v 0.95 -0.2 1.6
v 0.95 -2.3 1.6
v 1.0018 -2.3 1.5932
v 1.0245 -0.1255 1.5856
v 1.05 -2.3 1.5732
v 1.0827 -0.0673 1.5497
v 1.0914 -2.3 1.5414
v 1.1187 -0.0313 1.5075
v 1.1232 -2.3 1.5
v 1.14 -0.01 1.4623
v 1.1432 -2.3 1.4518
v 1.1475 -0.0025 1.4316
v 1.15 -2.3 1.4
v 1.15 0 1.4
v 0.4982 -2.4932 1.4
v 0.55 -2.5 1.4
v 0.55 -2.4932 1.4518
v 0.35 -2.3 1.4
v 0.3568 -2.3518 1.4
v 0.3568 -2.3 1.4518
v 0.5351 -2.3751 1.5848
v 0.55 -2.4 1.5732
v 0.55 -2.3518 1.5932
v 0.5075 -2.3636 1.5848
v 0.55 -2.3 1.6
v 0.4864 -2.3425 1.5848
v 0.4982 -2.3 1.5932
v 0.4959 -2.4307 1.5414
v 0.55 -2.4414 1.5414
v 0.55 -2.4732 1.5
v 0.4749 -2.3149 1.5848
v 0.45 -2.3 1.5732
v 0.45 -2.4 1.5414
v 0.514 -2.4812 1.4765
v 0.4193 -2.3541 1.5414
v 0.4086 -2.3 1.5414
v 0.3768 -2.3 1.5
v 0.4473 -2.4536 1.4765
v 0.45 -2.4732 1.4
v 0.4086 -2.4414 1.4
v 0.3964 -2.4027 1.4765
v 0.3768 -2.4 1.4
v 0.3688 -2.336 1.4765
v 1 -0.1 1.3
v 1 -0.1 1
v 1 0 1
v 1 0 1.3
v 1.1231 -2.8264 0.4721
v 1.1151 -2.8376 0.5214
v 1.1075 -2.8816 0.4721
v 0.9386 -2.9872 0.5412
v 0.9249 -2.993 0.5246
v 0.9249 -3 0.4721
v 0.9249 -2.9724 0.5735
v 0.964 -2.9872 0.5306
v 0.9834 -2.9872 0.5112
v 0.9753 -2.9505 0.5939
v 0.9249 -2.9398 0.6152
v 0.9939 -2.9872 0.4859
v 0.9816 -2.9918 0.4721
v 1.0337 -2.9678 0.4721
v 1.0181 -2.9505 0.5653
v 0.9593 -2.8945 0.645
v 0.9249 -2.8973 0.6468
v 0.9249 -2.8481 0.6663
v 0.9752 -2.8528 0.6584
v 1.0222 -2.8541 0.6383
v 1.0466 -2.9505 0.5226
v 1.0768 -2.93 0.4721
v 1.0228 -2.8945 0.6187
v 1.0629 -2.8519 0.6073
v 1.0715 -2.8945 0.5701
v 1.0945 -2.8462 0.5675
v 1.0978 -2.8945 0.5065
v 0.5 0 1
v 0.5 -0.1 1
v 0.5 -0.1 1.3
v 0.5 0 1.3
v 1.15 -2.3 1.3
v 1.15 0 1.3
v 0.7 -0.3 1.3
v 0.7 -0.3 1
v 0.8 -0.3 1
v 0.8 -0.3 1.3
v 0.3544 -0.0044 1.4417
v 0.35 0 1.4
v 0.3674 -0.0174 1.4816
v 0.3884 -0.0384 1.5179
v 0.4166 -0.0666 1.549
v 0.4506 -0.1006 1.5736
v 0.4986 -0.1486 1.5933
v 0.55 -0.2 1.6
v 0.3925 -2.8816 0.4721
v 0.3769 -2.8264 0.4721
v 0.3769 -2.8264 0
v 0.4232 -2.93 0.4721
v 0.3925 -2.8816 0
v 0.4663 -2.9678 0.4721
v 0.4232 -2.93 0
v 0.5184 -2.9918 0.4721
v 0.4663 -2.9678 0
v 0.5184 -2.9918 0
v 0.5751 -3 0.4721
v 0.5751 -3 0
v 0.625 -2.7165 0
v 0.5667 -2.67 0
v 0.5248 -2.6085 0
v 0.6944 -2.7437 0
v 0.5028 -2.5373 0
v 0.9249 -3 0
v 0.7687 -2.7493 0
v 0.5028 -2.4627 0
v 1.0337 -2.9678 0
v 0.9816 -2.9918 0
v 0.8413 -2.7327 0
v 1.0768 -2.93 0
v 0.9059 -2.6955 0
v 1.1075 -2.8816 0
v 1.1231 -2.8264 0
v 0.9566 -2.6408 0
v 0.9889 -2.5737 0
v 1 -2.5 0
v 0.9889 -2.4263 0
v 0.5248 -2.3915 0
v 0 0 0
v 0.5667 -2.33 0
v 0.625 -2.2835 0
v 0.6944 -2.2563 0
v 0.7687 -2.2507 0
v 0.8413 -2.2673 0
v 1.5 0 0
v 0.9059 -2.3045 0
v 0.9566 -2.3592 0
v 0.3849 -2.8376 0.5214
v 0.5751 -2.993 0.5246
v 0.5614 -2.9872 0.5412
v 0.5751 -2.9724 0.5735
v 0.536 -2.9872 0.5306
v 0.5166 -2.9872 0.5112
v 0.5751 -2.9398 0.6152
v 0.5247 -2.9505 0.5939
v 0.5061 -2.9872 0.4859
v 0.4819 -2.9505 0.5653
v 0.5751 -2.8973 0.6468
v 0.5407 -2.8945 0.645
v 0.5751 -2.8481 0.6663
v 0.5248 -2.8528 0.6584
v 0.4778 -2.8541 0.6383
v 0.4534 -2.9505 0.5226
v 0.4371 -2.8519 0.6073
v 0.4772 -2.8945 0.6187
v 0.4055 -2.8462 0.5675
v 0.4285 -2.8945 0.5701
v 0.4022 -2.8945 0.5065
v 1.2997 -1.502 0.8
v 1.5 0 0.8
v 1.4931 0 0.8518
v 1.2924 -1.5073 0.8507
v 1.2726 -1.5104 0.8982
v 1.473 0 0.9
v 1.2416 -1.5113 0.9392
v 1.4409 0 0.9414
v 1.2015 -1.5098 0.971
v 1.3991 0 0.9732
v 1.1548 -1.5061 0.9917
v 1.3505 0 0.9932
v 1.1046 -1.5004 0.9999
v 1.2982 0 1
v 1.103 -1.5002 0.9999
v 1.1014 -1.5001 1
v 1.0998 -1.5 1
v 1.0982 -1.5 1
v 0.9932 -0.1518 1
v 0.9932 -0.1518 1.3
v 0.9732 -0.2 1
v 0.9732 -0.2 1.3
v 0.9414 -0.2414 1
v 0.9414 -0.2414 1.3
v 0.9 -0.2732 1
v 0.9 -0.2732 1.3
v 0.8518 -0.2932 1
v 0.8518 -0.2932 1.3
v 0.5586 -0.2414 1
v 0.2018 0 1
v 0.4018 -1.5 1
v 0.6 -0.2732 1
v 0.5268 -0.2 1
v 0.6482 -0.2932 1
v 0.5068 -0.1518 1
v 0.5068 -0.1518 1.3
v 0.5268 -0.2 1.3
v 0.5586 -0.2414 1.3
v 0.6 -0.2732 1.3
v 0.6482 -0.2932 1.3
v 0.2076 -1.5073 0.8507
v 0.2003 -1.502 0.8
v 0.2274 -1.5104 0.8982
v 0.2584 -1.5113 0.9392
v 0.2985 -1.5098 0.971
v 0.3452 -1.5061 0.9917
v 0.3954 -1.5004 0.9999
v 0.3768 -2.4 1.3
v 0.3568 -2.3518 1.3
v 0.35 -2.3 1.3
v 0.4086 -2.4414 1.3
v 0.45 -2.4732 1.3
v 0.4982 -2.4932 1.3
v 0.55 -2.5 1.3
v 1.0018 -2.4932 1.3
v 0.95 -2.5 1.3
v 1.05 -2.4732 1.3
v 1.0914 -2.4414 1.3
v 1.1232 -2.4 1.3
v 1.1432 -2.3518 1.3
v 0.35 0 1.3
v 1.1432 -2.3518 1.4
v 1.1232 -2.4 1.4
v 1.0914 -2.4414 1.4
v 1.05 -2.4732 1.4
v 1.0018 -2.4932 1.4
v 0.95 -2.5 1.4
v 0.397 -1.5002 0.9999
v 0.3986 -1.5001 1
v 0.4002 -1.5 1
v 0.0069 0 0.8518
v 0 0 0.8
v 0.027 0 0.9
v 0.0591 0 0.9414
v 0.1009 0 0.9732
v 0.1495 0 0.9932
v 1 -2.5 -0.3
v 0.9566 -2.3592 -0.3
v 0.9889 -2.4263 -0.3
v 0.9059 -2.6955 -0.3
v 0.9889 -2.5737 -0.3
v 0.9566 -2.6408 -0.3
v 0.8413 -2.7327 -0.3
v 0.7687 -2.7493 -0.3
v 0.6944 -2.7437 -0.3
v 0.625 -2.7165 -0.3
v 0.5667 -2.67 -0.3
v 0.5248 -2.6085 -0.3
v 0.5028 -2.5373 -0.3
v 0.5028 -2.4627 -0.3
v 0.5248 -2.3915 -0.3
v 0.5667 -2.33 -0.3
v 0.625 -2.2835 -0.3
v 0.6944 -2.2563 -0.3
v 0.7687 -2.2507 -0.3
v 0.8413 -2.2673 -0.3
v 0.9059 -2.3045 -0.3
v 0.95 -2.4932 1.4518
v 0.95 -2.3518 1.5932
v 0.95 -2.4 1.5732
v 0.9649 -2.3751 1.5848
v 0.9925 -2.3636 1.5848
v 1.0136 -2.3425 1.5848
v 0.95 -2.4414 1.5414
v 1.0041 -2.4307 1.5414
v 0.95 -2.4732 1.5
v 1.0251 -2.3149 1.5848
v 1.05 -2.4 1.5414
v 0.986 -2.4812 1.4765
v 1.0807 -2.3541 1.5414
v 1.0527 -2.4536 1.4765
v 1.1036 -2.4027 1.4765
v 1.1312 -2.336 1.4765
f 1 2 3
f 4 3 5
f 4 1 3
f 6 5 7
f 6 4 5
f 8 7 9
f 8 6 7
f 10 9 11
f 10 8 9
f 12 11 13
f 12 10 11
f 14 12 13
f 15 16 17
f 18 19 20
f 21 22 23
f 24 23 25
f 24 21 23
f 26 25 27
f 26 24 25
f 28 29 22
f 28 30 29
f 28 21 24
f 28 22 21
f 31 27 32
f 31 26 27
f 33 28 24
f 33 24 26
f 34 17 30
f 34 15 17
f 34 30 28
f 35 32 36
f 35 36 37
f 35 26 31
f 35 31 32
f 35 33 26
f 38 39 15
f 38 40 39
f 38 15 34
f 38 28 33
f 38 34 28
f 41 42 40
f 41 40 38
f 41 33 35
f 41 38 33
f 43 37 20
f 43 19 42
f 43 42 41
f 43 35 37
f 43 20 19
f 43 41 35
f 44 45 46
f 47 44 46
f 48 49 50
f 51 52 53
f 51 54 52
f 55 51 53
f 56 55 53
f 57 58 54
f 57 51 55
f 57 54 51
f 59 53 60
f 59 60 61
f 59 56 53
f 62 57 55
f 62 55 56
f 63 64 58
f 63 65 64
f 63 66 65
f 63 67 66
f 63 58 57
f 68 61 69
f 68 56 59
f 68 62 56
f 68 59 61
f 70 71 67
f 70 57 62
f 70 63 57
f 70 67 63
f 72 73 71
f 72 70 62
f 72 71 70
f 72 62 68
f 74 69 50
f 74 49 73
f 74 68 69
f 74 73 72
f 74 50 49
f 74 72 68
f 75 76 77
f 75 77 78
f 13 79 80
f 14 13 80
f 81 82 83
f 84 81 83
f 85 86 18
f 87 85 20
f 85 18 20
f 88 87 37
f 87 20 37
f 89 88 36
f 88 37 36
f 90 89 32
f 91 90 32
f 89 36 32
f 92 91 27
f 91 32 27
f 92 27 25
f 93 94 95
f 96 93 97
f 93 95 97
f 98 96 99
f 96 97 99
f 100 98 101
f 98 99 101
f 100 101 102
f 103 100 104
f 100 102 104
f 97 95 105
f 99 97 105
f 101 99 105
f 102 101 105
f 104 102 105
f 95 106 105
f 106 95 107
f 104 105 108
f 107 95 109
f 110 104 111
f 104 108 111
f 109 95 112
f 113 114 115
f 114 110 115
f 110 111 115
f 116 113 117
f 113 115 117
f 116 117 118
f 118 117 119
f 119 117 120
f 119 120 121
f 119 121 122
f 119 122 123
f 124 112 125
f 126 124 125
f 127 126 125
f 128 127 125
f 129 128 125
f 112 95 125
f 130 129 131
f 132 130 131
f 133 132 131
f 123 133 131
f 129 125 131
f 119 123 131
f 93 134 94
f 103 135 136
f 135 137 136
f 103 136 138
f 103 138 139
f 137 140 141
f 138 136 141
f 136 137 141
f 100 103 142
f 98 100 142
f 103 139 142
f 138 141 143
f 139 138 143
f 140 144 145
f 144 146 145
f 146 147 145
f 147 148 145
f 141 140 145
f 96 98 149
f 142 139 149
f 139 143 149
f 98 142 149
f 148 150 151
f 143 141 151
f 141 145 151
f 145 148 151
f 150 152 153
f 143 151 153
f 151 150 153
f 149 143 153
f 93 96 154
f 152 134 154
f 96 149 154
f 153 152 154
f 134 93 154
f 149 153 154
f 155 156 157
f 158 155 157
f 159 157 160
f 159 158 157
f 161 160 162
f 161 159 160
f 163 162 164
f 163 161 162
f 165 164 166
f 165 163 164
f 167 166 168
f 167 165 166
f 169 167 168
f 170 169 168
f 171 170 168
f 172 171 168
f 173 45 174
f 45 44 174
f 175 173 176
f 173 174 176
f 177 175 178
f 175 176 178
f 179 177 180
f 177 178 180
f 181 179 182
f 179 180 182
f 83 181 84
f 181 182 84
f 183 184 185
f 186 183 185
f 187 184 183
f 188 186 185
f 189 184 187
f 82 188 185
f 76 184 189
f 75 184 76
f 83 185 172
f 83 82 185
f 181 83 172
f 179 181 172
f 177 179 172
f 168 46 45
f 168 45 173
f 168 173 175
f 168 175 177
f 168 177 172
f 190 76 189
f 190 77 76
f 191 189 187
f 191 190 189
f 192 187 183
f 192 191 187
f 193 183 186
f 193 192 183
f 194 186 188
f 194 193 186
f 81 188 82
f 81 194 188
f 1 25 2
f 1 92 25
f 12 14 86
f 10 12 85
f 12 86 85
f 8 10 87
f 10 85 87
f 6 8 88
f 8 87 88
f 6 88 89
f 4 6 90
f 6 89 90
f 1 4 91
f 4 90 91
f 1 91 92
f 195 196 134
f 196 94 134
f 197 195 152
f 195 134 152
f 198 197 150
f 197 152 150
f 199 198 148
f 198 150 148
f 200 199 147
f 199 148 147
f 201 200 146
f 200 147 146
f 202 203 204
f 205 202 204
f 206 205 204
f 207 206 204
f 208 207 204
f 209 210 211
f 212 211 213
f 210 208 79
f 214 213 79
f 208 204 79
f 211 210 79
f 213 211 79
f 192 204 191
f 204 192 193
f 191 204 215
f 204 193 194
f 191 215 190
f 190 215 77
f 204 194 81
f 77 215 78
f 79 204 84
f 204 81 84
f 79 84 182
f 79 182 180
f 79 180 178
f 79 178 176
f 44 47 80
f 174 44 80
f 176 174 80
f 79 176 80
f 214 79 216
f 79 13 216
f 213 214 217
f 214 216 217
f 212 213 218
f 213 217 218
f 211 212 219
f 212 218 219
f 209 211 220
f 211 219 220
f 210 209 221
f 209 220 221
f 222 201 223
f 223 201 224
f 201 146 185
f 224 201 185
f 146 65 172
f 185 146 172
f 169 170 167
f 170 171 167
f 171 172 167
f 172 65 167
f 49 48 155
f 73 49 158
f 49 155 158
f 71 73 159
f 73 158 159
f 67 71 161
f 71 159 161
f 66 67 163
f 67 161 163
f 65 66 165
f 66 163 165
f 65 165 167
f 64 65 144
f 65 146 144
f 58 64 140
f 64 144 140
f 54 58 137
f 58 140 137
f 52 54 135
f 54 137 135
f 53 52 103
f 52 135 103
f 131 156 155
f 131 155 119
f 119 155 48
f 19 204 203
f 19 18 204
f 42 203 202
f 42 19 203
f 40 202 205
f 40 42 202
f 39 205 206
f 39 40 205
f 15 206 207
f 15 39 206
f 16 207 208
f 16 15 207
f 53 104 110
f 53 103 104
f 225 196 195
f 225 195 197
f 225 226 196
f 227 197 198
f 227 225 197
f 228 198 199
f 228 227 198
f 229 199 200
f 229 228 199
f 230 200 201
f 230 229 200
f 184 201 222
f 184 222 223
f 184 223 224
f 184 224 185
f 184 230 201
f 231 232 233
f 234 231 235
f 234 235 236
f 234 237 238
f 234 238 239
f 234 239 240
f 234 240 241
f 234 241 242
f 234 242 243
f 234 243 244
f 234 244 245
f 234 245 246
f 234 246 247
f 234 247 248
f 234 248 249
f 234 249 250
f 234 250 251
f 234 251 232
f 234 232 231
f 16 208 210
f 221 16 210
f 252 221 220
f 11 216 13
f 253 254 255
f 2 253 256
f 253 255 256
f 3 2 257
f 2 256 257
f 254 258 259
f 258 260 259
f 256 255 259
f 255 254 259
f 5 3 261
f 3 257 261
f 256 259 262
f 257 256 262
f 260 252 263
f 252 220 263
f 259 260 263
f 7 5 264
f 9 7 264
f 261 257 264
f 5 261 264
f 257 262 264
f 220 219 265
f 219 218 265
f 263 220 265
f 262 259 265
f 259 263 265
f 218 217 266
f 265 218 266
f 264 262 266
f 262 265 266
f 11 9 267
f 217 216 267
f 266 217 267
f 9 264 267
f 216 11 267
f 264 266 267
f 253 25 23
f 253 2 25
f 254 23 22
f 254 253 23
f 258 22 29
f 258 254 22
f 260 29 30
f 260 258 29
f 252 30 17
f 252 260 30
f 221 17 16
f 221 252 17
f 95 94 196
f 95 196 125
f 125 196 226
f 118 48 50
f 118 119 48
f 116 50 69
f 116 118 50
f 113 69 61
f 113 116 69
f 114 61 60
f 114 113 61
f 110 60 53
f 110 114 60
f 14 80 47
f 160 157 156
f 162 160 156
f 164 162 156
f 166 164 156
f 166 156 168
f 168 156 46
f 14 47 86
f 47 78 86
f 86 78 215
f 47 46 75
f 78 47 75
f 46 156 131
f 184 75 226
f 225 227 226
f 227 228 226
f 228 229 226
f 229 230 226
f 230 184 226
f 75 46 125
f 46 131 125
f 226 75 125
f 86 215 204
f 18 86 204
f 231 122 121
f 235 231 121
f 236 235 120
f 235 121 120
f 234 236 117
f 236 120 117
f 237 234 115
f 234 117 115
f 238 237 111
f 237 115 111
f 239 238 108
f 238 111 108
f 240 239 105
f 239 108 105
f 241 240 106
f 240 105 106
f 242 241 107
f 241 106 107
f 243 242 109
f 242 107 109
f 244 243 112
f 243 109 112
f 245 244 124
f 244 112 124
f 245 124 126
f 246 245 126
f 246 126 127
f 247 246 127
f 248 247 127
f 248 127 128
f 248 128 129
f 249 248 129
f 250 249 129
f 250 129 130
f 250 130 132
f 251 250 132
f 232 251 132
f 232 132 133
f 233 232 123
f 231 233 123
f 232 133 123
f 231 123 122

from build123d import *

# Parameters (mm, degrees)
F0_W      = 1.5
F0_H      = 1
F1_DEPTH  = 3
F3_DEPTH  = 25
F5_DEPTH  = 25
F6_R      = 0.25
F7_DEPTH  = 0.3
F8_W      = 0.5
F8_H      = 0.3
F9_DEPTH  = 0.3
F10_W     = 0.5
F10_H     = 0.3
F11_DEPTH = 0.3
F12_R     = 0.2
F13_R     = 0.2


with BuildPart() as f1:
    # F0 (on Front) → F1 (new body)
    with BuildSketch(Plane.XZ):
        with Locations((0.75, 0.5)):
            Rectangle(F0_W, F0_H)
    extrude(amount=F1_DEPTH)

    # F2 (on face) → F3 (cut)
    with BuildSketch(Plane.YZ.offset(1.5)):
        Polygon((-3, 1), (-3, 0.6286599091), (-1.5, 1), align=None)
    extrude(amount=-F3_DEPTH, mode=Mode.SUBTRACT)

    # F4 (on face) → F5 (cut)
    with BuildSketch(Plane.XY.offset(1)):
        Polygon((1.5, -1.5), (1.5, 0), (1.3, -1.5), align=None)
        Polygon((1.5, -1.5), (1.3, -1.5), (1.1, -3), (1.5, -3), align=None)
        Polygon((0.2, -1.5), (0, 0), (0, -1.5), align=None)
        Polygon((0.4, -3), (0.2, -1.5), (0, -1.5), (0, -3), align=None)
    extrude(amount=-F5_DEPTH, mode=Mode.SUBTRACT)

    # F6 (on face) → F7 (join)
    with BuildSketch(Plane(origin=(0, 0, 0), x_dir=(1, 0, 0), z_dir=(0, 0, -1))):
        with Locations((0.75, 2.5)):
            Circle(F6_R)
    extrude(amount=F7_DEPTH)

    # F8 (on face) → F9 (join)
    with BuildSketch(Plane.XY.offset(1)):
        with Locations((0.75, -0.15)):
            Rectangle(F8_W, F8_H)
    extrude(amount=F9_DEPTH)

    # F10 (on face) → F11 (join)
    with BuildSketch(Plane.XY.offset(1.3)):
        Polygon((0.5, 0), (0.35, 0), (0.35, -2.5), (1.15, -2.5), (1.15, 0), (1, 0), (1, -0.3), (0.5, -0.3), align=None)
        with Locations((0.75, -0.15)):
            Rectangle(F10_W, F10_H)
    extrude(amount=F11_DEPTH)

    # F12
    f12_edges = [f1.edges().sort_by_distance(p)[0] for p in [
        (1.2, -2.25, 0.81433),
        (0.3, -2.25, 0.81433),
        (0.75, -3, 0.62866),
        (1.4, -0.75, 1),
        (0.1, -0.75, 1),
        (0.4, -3, 0.31433),
        (1.1, -3, 0.31433),
    ]]
    fillet(f12_edges, radius=F12_R)

    # F13
    f13_edges = [f1.edges().sort_by_distance(p)[0] for p in [
        (1, -0.3, 1.15),
        (0.5, -0.3, 1.15),
        (0.35, -2.5, 1.45),
        (1.15, -2.5, 1.45),
        (0.75, -2.5, 1.6),
        (0.35, -1.25, 1.6),
        (1.15, -1.25, 1.6),
        (0.75, 0, 1.6),
    ]]
    fillet(f13_edges, radius=F13_R)


solid = f1.part
